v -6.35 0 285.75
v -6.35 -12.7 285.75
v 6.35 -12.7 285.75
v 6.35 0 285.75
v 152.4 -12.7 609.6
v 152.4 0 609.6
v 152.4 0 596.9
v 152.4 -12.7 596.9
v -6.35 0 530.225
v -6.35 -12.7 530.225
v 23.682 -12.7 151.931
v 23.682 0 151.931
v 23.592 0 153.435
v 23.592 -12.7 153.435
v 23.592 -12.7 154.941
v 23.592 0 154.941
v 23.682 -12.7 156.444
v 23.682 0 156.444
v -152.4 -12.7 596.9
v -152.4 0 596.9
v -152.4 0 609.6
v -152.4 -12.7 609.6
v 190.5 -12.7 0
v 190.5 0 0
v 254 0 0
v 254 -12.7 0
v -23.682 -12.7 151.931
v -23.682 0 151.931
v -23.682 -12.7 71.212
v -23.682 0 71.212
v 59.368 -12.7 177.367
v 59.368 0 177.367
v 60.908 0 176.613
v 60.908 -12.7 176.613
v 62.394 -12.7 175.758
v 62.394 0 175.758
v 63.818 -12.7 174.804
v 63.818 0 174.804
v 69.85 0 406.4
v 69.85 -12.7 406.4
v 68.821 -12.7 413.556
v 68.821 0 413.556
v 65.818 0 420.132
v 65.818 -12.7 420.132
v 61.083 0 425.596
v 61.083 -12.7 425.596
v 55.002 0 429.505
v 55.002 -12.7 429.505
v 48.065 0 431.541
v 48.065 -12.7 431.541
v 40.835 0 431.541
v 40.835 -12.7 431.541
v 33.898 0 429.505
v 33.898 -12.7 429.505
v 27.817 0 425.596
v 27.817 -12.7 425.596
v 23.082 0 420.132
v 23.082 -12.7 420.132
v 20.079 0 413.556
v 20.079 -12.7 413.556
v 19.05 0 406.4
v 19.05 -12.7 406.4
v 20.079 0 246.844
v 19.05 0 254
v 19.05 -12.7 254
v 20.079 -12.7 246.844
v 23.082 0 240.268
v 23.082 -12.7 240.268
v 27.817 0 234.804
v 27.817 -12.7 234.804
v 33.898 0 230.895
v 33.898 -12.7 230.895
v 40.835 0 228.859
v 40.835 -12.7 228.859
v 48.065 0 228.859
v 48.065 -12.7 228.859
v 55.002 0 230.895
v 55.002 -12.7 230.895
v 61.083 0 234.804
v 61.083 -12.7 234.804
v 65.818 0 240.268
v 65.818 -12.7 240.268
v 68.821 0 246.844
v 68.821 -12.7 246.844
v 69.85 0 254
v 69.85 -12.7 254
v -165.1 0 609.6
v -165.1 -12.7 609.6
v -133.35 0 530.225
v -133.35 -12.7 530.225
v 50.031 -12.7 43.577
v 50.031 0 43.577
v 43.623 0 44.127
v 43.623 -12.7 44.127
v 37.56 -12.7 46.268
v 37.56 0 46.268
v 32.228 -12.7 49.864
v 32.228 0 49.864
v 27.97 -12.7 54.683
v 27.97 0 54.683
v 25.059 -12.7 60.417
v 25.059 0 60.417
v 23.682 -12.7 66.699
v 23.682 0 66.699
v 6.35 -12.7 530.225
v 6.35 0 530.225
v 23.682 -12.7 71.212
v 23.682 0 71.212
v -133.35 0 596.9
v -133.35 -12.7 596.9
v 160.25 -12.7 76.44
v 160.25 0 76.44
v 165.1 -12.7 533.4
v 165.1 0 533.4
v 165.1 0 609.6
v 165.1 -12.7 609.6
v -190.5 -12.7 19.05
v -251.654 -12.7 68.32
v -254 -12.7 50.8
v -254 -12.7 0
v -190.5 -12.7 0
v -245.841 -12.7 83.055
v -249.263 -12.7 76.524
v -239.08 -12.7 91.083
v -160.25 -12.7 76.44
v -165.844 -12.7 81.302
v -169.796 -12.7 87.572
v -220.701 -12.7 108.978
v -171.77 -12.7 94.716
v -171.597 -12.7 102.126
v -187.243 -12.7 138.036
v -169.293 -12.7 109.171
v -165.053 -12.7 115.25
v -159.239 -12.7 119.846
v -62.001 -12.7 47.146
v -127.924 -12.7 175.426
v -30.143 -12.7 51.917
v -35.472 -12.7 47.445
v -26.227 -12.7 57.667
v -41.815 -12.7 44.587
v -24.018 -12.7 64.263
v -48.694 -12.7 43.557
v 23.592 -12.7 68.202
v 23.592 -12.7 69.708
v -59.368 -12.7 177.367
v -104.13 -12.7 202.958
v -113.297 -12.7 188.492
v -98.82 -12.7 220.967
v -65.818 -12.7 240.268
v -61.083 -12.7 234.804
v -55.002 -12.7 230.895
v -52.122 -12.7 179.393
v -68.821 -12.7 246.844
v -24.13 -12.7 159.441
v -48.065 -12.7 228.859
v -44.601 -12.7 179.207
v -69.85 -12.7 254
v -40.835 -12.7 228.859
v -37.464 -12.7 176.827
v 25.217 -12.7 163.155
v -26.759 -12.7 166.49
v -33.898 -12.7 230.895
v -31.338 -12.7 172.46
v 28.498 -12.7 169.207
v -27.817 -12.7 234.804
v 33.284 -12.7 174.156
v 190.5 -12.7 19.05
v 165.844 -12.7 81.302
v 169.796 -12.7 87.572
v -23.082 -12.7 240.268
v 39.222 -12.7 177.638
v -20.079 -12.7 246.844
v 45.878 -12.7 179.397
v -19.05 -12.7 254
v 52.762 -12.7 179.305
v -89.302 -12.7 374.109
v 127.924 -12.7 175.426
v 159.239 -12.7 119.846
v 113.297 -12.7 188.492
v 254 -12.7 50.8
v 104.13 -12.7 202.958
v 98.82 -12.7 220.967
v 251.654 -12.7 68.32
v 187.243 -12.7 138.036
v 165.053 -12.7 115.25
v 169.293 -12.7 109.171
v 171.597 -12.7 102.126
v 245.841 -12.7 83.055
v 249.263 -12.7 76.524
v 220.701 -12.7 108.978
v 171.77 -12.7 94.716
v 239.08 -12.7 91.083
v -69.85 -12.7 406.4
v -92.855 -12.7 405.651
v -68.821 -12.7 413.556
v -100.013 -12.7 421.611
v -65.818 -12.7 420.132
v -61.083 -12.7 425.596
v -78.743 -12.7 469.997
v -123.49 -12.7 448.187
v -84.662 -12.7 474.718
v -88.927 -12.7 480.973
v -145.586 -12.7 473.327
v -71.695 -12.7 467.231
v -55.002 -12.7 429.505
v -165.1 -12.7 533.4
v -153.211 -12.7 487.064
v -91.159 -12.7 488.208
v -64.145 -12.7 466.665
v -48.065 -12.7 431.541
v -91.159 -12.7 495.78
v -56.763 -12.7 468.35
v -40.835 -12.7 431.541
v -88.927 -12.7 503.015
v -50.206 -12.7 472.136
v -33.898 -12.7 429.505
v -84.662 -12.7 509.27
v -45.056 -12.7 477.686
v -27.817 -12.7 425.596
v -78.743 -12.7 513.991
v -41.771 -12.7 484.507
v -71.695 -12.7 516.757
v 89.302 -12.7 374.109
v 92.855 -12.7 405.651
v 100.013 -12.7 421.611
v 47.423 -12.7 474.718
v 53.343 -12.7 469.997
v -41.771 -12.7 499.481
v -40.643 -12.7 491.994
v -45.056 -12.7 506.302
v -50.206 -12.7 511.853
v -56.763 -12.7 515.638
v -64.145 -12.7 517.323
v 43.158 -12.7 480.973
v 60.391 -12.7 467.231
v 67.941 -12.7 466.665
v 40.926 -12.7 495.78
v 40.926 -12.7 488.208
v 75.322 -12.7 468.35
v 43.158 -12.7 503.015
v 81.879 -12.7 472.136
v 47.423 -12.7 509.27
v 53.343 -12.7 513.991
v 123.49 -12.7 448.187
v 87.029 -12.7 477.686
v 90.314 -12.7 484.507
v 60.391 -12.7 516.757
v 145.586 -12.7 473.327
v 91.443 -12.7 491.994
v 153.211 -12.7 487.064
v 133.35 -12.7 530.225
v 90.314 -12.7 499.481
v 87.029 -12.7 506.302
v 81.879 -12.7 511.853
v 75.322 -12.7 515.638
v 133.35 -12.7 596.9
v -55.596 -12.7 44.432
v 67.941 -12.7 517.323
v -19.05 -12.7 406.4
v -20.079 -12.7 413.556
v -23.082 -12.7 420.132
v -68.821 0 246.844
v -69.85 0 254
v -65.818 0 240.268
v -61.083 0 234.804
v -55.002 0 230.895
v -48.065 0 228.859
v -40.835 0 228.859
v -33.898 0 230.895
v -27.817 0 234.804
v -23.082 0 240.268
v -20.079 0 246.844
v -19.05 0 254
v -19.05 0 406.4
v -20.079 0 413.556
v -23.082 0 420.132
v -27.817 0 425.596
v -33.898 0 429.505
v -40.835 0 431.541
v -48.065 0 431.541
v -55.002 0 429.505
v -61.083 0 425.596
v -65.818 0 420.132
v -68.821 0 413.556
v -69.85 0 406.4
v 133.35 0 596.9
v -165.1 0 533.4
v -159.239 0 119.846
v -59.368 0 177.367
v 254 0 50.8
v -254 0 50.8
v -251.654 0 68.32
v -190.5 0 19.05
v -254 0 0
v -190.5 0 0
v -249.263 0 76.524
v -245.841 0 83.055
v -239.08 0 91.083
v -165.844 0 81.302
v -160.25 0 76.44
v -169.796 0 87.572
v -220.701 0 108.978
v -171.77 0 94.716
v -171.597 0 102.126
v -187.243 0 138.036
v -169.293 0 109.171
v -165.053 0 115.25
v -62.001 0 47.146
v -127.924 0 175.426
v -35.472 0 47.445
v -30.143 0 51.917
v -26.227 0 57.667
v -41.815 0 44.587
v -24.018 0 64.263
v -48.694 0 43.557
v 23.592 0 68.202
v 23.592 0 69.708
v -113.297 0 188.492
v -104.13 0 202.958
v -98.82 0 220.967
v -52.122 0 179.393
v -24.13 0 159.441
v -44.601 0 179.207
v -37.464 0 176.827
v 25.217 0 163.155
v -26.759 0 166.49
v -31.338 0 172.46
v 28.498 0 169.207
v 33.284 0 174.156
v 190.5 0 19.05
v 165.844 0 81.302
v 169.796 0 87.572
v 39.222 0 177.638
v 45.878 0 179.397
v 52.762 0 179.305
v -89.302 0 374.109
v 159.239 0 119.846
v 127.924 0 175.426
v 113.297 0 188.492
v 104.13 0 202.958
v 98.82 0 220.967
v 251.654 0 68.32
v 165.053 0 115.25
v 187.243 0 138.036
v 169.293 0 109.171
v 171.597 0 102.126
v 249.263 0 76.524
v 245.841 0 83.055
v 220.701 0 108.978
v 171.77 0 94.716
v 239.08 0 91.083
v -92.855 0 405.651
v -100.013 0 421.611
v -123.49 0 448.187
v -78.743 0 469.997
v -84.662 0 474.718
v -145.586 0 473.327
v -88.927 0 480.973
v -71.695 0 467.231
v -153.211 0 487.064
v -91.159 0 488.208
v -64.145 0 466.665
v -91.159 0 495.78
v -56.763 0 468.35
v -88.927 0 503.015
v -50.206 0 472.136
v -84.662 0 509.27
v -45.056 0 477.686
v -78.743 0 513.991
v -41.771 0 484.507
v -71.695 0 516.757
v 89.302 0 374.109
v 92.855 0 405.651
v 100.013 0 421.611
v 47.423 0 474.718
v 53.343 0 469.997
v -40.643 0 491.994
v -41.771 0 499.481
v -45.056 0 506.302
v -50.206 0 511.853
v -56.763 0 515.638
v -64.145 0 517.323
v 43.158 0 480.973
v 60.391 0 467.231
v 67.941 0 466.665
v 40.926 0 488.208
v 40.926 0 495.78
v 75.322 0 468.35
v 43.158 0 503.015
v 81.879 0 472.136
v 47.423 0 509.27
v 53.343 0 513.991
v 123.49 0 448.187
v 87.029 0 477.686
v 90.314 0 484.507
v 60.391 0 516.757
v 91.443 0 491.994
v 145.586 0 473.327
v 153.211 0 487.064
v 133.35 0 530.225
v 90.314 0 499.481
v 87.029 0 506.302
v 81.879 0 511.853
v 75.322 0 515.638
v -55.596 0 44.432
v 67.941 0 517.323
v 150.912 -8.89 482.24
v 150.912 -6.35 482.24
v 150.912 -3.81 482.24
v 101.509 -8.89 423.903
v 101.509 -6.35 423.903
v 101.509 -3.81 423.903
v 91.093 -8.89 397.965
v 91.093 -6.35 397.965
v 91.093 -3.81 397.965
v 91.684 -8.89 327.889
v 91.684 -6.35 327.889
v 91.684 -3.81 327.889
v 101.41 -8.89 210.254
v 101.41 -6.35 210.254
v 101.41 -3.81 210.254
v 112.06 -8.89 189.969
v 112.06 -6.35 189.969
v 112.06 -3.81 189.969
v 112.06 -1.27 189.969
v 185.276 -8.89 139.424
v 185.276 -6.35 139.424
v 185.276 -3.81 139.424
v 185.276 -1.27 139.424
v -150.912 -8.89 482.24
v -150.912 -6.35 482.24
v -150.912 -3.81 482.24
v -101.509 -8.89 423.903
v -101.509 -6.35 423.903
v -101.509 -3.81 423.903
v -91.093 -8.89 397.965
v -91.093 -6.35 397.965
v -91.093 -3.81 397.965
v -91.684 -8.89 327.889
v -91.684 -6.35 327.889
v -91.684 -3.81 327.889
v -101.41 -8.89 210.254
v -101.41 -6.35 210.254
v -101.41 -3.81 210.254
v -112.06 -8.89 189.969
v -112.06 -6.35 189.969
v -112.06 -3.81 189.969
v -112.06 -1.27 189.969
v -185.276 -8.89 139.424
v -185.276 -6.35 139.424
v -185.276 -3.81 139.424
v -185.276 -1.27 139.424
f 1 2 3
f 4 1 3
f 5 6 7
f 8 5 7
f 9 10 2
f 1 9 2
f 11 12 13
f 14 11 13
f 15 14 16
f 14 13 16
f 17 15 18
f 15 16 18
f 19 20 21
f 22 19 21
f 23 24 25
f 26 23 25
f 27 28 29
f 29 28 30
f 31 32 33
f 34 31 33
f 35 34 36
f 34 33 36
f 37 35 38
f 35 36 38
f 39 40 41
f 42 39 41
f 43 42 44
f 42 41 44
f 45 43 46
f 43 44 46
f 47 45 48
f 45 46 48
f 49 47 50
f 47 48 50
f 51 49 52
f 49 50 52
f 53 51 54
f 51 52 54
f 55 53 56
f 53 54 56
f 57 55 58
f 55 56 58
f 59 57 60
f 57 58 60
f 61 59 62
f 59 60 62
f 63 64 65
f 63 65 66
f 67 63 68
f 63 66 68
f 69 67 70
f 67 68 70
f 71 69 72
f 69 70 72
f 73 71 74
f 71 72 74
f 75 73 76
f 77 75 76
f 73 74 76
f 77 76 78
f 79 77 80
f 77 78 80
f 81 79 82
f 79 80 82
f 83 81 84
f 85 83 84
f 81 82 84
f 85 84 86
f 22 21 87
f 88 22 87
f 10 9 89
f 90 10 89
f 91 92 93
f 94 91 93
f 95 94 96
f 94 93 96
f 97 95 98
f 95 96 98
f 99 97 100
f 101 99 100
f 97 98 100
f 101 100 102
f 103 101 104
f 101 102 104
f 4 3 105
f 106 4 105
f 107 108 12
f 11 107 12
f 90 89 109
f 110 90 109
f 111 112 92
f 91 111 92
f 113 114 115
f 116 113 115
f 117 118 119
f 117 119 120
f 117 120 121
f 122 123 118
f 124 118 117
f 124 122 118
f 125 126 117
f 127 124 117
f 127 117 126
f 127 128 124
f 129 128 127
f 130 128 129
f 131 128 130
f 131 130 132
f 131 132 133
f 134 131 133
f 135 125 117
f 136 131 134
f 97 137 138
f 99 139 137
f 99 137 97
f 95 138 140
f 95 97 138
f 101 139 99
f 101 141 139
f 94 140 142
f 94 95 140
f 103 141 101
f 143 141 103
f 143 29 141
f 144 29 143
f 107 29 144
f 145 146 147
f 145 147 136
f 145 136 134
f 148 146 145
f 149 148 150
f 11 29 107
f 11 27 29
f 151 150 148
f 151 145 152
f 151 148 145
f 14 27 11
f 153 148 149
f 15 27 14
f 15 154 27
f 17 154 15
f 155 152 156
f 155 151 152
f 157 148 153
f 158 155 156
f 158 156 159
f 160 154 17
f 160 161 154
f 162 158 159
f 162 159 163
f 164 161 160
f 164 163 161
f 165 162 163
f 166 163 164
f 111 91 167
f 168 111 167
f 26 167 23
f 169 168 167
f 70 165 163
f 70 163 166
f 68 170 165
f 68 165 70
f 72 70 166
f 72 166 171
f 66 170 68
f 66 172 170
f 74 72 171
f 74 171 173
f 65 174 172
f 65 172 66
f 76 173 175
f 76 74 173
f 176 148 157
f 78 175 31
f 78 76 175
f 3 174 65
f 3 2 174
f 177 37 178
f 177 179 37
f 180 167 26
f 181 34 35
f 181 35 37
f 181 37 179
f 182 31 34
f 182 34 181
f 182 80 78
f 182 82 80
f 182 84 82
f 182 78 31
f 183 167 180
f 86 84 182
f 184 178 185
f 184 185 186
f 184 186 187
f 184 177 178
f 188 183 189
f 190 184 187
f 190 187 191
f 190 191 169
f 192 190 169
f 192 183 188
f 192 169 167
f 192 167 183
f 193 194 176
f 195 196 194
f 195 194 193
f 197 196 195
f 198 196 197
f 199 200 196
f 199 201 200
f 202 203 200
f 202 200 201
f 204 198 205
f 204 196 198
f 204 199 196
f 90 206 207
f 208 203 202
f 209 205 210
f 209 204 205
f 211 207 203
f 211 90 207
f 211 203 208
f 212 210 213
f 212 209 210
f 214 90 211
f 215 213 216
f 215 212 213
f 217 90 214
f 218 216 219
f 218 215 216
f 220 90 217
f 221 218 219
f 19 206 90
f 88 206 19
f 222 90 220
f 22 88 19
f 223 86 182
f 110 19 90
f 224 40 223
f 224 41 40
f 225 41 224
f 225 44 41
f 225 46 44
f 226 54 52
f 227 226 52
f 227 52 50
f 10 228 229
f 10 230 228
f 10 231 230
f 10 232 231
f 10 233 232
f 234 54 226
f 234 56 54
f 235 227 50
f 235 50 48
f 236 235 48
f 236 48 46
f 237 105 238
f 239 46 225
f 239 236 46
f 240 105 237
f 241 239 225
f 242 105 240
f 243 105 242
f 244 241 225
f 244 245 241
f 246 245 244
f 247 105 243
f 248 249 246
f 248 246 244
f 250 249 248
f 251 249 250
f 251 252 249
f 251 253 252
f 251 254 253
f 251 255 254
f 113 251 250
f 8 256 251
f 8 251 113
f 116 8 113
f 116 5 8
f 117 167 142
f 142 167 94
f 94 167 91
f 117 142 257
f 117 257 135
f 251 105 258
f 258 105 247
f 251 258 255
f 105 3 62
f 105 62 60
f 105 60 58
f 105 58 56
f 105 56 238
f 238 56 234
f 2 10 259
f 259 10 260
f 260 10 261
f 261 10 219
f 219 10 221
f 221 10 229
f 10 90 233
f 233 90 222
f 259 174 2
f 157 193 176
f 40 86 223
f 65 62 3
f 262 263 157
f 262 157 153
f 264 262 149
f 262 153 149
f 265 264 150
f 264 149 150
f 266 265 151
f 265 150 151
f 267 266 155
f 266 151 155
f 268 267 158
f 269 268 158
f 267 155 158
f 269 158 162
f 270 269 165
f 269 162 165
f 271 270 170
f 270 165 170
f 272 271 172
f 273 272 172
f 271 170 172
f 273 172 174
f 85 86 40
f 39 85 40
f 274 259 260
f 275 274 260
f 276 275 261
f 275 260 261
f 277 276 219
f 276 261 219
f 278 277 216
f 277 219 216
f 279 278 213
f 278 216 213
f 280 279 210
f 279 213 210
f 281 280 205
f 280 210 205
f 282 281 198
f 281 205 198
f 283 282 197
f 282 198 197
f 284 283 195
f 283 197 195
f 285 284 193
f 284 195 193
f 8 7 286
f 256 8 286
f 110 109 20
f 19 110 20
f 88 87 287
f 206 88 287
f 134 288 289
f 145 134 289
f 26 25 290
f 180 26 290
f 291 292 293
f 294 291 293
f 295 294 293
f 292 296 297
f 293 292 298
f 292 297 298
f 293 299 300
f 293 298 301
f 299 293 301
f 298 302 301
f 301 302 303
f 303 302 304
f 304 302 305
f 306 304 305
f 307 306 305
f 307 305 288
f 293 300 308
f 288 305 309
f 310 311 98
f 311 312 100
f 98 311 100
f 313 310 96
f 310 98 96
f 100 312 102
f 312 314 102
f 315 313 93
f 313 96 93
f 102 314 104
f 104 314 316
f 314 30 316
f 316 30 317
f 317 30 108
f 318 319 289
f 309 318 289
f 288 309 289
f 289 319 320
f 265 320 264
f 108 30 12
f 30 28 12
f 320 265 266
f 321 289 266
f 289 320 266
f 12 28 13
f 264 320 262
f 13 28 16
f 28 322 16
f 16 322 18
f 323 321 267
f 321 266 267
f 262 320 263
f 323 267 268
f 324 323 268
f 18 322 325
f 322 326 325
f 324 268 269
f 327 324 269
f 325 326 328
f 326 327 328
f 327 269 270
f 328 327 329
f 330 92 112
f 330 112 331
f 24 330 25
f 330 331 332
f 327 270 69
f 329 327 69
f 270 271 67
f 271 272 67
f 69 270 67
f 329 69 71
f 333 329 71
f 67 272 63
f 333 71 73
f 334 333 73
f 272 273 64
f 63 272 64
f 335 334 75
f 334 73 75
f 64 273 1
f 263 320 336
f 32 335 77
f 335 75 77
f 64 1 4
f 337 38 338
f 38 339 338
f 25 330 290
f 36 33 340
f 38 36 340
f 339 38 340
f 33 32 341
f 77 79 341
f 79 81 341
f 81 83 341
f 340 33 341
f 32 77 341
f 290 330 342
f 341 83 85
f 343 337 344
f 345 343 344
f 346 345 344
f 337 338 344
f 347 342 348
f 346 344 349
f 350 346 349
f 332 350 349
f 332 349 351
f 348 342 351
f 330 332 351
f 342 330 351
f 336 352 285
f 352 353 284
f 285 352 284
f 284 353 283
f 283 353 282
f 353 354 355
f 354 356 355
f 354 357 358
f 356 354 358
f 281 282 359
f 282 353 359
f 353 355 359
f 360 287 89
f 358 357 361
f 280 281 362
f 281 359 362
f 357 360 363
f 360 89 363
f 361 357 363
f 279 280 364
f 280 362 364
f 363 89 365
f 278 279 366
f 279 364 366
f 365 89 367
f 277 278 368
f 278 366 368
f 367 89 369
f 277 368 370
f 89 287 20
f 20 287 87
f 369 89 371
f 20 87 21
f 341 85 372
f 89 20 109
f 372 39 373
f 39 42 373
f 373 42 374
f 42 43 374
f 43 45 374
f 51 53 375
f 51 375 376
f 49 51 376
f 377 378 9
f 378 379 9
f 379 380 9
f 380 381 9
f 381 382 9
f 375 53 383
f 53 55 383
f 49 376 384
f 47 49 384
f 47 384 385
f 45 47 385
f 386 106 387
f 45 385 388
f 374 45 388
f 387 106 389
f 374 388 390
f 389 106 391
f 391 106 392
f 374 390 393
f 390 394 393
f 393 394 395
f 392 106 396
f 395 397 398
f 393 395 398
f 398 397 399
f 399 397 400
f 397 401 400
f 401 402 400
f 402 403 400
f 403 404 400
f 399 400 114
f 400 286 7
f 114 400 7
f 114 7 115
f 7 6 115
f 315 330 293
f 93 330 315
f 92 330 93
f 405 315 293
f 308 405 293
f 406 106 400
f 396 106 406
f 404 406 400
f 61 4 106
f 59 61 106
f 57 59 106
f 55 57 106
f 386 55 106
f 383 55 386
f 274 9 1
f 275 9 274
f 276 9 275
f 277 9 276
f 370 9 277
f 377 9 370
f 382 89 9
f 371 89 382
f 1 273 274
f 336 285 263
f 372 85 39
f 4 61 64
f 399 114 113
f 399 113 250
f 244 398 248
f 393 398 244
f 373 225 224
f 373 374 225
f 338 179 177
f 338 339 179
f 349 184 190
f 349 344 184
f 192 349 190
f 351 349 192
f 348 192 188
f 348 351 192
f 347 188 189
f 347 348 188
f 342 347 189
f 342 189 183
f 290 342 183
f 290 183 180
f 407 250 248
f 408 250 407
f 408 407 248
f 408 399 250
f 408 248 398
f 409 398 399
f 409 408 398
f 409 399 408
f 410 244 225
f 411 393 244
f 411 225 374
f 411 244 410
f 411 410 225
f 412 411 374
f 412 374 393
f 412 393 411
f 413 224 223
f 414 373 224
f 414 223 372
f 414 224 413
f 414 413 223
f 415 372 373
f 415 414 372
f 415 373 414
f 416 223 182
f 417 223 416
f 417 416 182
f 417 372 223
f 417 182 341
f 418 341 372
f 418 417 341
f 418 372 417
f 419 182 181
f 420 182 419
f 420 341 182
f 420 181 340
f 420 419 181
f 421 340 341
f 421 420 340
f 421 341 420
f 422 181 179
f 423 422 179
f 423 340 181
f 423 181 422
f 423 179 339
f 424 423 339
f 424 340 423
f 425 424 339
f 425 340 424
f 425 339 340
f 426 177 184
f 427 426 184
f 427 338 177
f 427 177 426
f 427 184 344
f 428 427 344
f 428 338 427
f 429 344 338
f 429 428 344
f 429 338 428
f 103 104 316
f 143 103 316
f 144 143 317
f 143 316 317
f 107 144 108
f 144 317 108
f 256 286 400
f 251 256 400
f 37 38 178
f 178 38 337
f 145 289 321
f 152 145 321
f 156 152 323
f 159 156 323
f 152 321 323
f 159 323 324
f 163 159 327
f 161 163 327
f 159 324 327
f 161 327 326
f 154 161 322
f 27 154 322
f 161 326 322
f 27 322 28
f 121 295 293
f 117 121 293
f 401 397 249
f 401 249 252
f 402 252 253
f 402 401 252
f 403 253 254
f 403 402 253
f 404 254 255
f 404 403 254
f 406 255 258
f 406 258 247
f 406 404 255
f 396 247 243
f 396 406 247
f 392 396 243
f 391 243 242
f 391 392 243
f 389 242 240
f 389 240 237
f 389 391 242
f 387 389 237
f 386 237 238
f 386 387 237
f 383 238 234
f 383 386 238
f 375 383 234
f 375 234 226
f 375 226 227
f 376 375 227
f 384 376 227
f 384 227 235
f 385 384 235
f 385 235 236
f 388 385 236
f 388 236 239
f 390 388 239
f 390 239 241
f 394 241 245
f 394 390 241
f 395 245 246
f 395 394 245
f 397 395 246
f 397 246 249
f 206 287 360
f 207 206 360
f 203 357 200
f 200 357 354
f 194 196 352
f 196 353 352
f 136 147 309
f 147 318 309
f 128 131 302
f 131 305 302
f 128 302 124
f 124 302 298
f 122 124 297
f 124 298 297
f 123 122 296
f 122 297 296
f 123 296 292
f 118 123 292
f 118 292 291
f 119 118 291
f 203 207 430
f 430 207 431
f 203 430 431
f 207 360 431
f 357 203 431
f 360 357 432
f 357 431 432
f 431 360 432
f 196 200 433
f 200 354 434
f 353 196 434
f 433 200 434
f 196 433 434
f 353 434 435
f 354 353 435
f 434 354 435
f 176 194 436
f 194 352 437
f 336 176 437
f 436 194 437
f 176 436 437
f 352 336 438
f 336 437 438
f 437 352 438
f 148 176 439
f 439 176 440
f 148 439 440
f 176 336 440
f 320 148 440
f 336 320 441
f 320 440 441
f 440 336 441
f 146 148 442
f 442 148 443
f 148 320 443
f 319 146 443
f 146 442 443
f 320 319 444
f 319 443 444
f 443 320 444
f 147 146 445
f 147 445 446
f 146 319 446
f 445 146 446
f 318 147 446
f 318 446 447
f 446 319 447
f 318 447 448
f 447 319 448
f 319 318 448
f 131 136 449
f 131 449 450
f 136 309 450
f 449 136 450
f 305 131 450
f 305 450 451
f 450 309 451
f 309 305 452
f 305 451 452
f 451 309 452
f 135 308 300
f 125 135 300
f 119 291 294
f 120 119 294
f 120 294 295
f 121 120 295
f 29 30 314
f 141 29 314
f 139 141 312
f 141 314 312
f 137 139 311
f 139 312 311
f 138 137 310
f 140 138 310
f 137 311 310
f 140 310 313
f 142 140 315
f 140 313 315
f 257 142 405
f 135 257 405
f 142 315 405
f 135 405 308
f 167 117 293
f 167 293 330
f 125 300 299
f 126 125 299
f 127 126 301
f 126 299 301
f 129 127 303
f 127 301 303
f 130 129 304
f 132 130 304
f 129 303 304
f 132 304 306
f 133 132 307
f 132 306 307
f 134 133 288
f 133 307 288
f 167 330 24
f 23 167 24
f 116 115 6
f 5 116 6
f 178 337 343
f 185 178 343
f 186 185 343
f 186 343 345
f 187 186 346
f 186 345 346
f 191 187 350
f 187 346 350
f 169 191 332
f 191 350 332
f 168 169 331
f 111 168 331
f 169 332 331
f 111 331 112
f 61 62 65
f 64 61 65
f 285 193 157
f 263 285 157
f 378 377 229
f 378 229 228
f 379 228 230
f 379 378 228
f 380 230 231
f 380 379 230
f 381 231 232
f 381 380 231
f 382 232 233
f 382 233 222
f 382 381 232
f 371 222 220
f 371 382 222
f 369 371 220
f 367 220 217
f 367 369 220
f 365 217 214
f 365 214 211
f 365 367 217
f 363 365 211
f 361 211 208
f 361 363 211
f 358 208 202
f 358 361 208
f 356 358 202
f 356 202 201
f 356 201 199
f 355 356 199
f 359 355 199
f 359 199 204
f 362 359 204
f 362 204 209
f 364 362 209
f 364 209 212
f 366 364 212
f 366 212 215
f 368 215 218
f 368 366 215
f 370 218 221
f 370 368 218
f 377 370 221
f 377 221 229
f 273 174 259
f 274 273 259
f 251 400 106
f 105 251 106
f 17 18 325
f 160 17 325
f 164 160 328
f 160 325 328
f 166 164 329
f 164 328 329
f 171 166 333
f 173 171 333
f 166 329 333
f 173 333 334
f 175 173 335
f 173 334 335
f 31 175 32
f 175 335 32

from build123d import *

# Parameters (mm, degrees)
F0_R     = 25.4
F1_DEPTH = 12.7
F2_W     = 12.7
F2_H     = 285.75
F3_DEPTH = 12.7
F5_DEPTH = 25.4
F7_DEPTH = 25.4


with BuildPart() as f1:
    # F0 (on Front) → F1 (new body)
    with BuildSketch(Plane.XZ):
        with BuildLine():
            Line((-6.35, 304.8), (0, 304.8))
            Line((0, 304.8), (0, 530.225))
            Line((0, 530.225), (-133.35, 530.225))
            Line((-133.35, 530.225), (-133.35, 596.9))
            Line((-133.35, 596.9), (-152.4, 596.9))
            Line((-152.4, 596.9), (-152.4, 609.6))
            Line((-152.4, 609.6), (-165.1, 609.6))
            Line((-165.1, 609.6), (-165.1, 533.4))
            add(Edge.make_bspline(
                [(-165.1, 533.4), (-161.9697013836, 516.0048850618), (-155.9318714731, 482.4525764355), (-125.5393550755, 449.0081112221), (-83.7666001834, 411.9480381505), (-93.3500119565, 326.8509854997), (-94.3836877464, 236.6940625404), (-106.4749493008, 180.4716743188), (-188.1929374524, 143.9043740357), (-228.1831750573, 100.3946907978), (-251.0192334088, 81.1936508198), (-252.9963492936, 61.0338134106), (-254, 50.8)],
                knots=[0, 0, 0, 0, 0.0959731621, 0.1851164057, 0.2805519957, 0.4025177519, 0.5319500735, 0.6289458648, 0.7530416243, 0.8572624534, 0.9275416072, 1, 1, 1, 1], degree=3))
            Line((-254, 50.8), (-254, 0))
            Line((-254, 0), (-190.5, 0))
            Line((-190.5, 0), (-190.5, 19.05))
            Line((-190.5, 19.05), (-6.35, 19.05))
            Line((-6.35, 19.05), (-6.35, 304.8))
        make_face()
        with BuildLine():
            Line((-62.0009822206, 47.1459924547), (-160.2498111723, 76.4396733512))
            ThreePointArc((-160.2498111723, 76.4396733512), (-171.9552123835, 98.4274609924), (-159.2389195946, 119.8464973987))
            Line((-159.2389195946, 119.8464973987), (-59.3678694771, 177.3668921793))
            ThreePointArc((-59.3678694771, 177.3668921793), (-34.2386394195, 174.8714173249), (-23.6816051959, 151.9311769942))
            Line((-23.6816051959, 151.9311769942), (-23.6816051959, 71.2117587397))
            ThreePointArc((-23.6816051959, 71.2117587397), (-35.4723478909, 47.4454693261), (-62.0009822206, 47.1459924547))
        make_face(mode=Mode.SUBTRACT)
        with Locations((-66.0427957773, 491.9940531254)):
            Circle(F0_R, mode=Mode.SUBTRACT)
        with BuildLine():
            Line((0, 530.225), (0, 304.8))
            Line((0, 304.8), (6.35, 304.8))
            Line((6.35, 304.8), (6.35, 19.05))
            Line((6.35, 19.05), (190.5, 19.05))
            Line((190.5, 19.05), (190.5, 0))
            Line((190.5, 0), (254, 0))
            Line((254, 0), (254, 50.8))
            add(Edge.make_bspline(
                [(165.1, 533.4), (161.9697013836, 516.0048850618), (155.9318714731, 482.4525764355), (125.5393550755, 449.0081112221), (83.7666001834, 411.9480381505), (93.3500119565, 326.8509854997), (94.3836877464, 236.6940625404), (106.4749493008, 180.4716743188), (188.1929374524, 143.9043740357), (228.1831750573, 100.3946907978), (251.0192334088, 81.1936508198), (252.9963492936, 61.0338134106), (254, 50.8)],
                knots=[0, 0, 0, 0, 0.0959731621, 0.1851164057, 0.2805519957, 0.4025177519, 0.5319500735, 0.6289458648, 0.7530416243, 0.8572624534, 0.9275416072, 1, 1, 1, 1], degree=3))
            Line((165.1, 533.4), (165.1, 609.6))
            Line((165.1, 609.6), (152.4, 609.6))
            Line((152.4, 609.6), (152.4, 596.9))
            Line((152.4, 596.9), (133.35, 596.9))
            Line((133.35, 596.9), (133.35, 530.225))
            Line((133.35, 530.225), (0, 530.225))
        make_face()
        with BuildLine():
            ThreePointArc((59.3678694771, 177.3668921793), (61.6579975727, 176.198075446), (63.8182289317, 174.8037226477))
            Line((63.8182289317, 174.8037226477), (159.2389195946, 119.8464973987))
            ThreePointArc((159.2389195946, 119.8464973987), (171.9552123835, 98.4274609924), (160.2498111723, 76.4396733512))
            Line((160.2498111723, 76.4396733512), (50.0307281778, 43.5769646513))
            ThreePointArc((50.0307281778, 43.5769646513), (32.2279529913, 49.8636621936), (23.6816051959, 66.6987835085))
            ThreePointArc((23.6816051959, 66.6987835085), (23.5811756199, 68.9552711241), (23.6816051959, 71.2117587397))
            Line((23.6816051959, 71.2117587397), (23.6816051959, 151.9311769942))
            ThreePointArc((23.6816051959, 151.9311769942), (23.5811756199, 154.1876646098), (23.6816051959, 156.4441522254))
            ThreePointArc((23.6816051959, 156.4441522254), (36.1344354237, 176.0993342479), (59.3678694771, 177.3668921793))
        make_face(mode=Mode.SUBTRACT)
        with Locations((66.0427957773, 491.9940531254)):
            Circle(F0_R, mode=Mode.SUBTRACT)
    extrude(amount=F1_DEPTH)

    # F2 (on face) → F3 (join)
    with BuildSketch(Plane.XZ.offset(12.7)):
        with Locations((0, 161.925)):
            Rectangle(F2_W, F2_H)
    extrude(amount=-F3_DEPTH)

    # F4 (on face) → F5 (cut)
    with BuildSketch(Plane.XZ.offset(12.7)):
        Polygon((6.35, 609.6), (0, 609.6), (-6.35, 609.6), (-6.35, 285.75), (6.35, 285.75), align=None)
    extrude(amount=-F5_DEPTH, mode=Mode.SUBTRACT)

    # F6 (on face) → F7 (cut)
    with BuildSketch(Plane.XZ.offset(12.7)):
        with BuildLine():
            Line((-19.05, 254), (-19.05, 406.4))
            ThreePointArc((-19.05, 406.4), (-44.45, 431.8), (-69.85, 406.4))
            Line((-69.85, 406.4), (-69.85, 254))
            ThreePointArc((-69.85, 254), (-44.45, 228.6), (-19.05, 254))
        make_face()
        with BuildLine():
            Line((69.85, 254), (69.85, 406.4))
            ThreePointArc((69.85, 406.4), (44.45, 431.8), (19.05, 406.4))
            Line((19.05, 406.4), (19.05, 254))
            ThreePointArc((19.05, 254), (44.45, 228.6), (69.85, 254))
        make_face()
    extrude(amount=-F7_DEPTH, mode=Mode.SUBTRACT)


solid = f1.part
